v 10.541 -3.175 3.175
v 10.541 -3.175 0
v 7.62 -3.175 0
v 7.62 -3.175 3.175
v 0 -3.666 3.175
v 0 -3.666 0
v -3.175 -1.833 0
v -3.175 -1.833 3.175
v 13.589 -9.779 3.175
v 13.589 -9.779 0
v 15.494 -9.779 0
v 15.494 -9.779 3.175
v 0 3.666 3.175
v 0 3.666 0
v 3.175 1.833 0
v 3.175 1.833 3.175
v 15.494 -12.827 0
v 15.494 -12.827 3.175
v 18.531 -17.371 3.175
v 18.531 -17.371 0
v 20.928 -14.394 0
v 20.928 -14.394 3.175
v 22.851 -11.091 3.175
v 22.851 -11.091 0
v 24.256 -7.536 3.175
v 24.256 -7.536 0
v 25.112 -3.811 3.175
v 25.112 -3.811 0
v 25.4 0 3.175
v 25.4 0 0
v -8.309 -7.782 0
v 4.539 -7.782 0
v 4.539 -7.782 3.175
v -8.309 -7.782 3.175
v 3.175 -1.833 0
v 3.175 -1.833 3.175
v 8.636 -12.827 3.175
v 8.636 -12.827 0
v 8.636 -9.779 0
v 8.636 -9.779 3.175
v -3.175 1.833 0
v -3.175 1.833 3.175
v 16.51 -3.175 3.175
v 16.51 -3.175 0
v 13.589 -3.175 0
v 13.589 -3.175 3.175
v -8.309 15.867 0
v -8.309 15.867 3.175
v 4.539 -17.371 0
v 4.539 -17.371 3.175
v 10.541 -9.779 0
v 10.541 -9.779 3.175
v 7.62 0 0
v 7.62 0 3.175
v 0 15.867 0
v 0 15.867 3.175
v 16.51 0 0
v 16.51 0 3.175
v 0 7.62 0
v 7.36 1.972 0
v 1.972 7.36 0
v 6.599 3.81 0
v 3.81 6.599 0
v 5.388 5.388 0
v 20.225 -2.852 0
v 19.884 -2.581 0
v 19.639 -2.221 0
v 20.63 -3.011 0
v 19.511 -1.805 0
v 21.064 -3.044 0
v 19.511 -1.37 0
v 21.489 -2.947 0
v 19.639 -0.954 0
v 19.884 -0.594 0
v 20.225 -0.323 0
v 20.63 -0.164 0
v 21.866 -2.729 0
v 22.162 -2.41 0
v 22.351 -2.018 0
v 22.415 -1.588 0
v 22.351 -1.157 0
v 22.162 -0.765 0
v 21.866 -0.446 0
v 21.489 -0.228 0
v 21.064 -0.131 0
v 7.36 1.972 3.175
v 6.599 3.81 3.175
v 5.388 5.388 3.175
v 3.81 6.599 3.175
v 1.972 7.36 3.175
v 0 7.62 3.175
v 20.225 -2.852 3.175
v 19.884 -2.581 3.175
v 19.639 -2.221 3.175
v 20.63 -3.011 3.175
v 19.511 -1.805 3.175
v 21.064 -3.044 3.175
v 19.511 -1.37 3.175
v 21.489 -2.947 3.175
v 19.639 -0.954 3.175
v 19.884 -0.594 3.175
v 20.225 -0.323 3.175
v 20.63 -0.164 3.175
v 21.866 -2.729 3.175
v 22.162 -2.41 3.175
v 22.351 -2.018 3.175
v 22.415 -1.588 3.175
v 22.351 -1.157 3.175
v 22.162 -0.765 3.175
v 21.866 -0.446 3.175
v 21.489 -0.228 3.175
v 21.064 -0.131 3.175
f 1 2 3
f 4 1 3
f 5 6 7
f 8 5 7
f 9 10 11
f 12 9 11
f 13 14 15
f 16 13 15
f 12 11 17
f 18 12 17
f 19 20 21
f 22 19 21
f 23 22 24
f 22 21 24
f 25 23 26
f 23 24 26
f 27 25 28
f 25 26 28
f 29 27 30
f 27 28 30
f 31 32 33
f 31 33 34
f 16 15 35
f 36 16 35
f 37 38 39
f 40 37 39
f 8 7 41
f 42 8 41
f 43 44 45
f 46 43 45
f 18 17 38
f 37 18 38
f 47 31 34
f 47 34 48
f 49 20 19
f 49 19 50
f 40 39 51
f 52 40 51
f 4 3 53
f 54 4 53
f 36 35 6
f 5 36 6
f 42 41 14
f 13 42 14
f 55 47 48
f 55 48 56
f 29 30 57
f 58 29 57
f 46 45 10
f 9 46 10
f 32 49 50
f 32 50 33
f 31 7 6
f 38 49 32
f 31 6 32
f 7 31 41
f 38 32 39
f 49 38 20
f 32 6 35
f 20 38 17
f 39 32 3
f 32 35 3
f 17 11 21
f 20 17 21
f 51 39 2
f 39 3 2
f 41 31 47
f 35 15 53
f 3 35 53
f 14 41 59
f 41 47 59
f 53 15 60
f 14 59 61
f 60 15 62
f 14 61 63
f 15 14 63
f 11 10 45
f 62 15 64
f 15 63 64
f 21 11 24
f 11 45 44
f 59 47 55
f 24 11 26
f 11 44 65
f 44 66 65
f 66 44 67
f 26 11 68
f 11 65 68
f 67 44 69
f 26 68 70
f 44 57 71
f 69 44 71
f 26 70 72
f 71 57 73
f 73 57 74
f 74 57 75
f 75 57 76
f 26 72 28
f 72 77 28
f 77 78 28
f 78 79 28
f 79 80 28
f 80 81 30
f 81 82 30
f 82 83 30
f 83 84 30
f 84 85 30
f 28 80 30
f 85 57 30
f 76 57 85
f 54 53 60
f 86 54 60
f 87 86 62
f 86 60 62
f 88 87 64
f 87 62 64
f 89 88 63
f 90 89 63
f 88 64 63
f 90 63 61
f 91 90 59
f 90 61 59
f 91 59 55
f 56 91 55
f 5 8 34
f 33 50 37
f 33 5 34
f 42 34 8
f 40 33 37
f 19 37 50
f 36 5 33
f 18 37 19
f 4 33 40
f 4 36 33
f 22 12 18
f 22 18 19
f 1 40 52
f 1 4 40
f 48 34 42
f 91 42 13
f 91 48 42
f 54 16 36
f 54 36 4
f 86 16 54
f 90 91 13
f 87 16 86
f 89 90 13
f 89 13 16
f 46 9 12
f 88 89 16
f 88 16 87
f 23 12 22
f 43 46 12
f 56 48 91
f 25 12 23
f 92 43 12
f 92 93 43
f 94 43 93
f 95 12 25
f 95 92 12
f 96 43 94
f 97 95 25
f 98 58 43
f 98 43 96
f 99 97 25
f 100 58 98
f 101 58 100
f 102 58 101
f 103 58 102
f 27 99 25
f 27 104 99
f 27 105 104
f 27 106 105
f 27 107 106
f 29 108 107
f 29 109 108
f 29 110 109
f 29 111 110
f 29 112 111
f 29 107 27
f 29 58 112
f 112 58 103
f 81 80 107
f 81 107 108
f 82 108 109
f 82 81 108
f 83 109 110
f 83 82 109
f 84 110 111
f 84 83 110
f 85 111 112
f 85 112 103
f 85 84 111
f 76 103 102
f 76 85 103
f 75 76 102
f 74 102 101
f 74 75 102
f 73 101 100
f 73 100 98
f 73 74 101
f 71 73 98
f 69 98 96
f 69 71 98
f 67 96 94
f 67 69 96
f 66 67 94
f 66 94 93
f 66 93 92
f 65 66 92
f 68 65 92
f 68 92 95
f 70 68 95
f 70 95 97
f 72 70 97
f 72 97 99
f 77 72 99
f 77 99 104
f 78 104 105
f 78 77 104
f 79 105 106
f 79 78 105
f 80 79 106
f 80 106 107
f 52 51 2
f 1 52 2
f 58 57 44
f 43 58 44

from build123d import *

# Parameters (mm, degrees)
SKETCH1_R           = 1.4605
BOSS_EXTRUDE1_DEPTH = 3.175
CUT_EXTRUDE1_REACH  = 105.107
CUT_EXTRUDE2_REACH  = 105.107
SKETCH4_W           = 25.4
SKETCH4_H           = 7.62
CUT_EXTRUDE3_DEPTH  = 36.774302562


with BuildPart() as part:
    # Sketch1 → Boss-Extrude1 (new body)
    with BuildSketch(Plane.XY):
        with BuildLine():
            Line((0, 7.62), (0, 25.4))
            ThreePointArc((0, 25.4), (-17.960512242, -17.960512242), (25.4, 0))
            Line((25.4, 0), (16.51, 0))
            Line((16.51, 0), (16.51, -3.175))
            Line((16.51, -3.175), (13.589, -3.175))
            Line((13.589, -3.175), (13.589, -9.779))
            Line((13.589, -9.779), (15.494, -9.779))
            Line((15.494, -9.779), (15.494, -12.827))
            Line((15.494, -12.827), (13.589, -12.827))
            Line((13.589, -12.827), (10.541, -12.827))
            Line((10.541, -12.827), (8.636, -12.827))
            Line((8.636, -12.827), (8.636, -9.779))
            Line((8.636, -9.779), (10.541, -9.779))
            Line((10.541, -9.779), (10.541, -3.175))
            Line((10.541, -3.175), (7.62, -3.175))
            Line((7.62, -3.175), (7.62, 0))
            ThreePointArc((7.62, 0), (5.388153673, 5.388153673), (0, 7.62))
        make_face()
        with Locations((20.955, -1.5875)):
            Circle(SKETCH1_R, mode=Mode.SUBTRACT)
        Polygon((3.175, 1.833087105), (3.175, -1.833087105), (0, -3.666174209), (-3.175, -1.833087105), (-3.175, 1.833087105), (0, 3.666174209), align=None, mode=Mode.SUBTRACT)
    extrude(amount=BOSS_EXTRUDE1_DEPTH)

    # Sketch2 → Cut-Extrude1 (cut, up to next)
    with BuildSketch(Plane(origin=(0, 0, -93.472), x_dir=(-1, 0, 0), z_dir=(0, 0, -1)), mode=Mode.PRIVATE) as cut_extrude1_sk1:
        Polygon((-4.538711403, -7.782479393), (27.834438784, -7.782479393), (16.089332095, -38.12601526), (-4.538711403, -36.427419359), align=None)
    cut_extrude1_tool1 = extrude(cut_extrude1_sk1.sketch, amount=-CUT_EXTRUDE1_REACH, mode=Mode.PRIVATE) & part.part
    add(cut_extrude1_tool1.solids().sort_by_distance((-9.075281, -21.483297, -93.472))[0], mode=Mode.SUBTRACT)

    # Sketch3 → Cut-Extrude2 (cut, up to next)
    with BuildSketch(Plane(origin=(0, 0, -93.472), x_dir=(-1, 0, 0), z_dir=(0, 0, -1)), mode=Mode.PRIVATE) as cut_extrude2_sk1:
        Polygon((8.30871298, -7.782479393), (8.30871298, 15.866972004), (0, 15.866972004), (0, 32.212276886), (53.906645957, 11.420627768), (19.587788586, -19.264211479), align=None)
    cut_extrude2_tool1 = extrude(cut_extrude2_sk1.sketch, amount=-CUT_EXTRUDE2_REACH, mode=Mode.PRIVATE) & part.part
    add(cut_extrude2_tool1.solids().sort_by_distance((-22.758535, 7.548852, -93.472))[0], mode=Mode.SUBTRACT)

    # Sketch4 → Cut-Extrude3 (cut, through all)
    with BuildSketch(Plane(origin=(0, 0, 0), x_dir=(-1, 0, 0), z_dir=(0, 0, -1))):
        with Locations((-17.238711403, -21.181200427)):
            Rectangle(SKETCH4_W, SKETCH4_H)
    extrude(amount=-CUT_EXTRUDE3_DEPTH, mode=Mode.SUBTRACT)


solid = part.part
